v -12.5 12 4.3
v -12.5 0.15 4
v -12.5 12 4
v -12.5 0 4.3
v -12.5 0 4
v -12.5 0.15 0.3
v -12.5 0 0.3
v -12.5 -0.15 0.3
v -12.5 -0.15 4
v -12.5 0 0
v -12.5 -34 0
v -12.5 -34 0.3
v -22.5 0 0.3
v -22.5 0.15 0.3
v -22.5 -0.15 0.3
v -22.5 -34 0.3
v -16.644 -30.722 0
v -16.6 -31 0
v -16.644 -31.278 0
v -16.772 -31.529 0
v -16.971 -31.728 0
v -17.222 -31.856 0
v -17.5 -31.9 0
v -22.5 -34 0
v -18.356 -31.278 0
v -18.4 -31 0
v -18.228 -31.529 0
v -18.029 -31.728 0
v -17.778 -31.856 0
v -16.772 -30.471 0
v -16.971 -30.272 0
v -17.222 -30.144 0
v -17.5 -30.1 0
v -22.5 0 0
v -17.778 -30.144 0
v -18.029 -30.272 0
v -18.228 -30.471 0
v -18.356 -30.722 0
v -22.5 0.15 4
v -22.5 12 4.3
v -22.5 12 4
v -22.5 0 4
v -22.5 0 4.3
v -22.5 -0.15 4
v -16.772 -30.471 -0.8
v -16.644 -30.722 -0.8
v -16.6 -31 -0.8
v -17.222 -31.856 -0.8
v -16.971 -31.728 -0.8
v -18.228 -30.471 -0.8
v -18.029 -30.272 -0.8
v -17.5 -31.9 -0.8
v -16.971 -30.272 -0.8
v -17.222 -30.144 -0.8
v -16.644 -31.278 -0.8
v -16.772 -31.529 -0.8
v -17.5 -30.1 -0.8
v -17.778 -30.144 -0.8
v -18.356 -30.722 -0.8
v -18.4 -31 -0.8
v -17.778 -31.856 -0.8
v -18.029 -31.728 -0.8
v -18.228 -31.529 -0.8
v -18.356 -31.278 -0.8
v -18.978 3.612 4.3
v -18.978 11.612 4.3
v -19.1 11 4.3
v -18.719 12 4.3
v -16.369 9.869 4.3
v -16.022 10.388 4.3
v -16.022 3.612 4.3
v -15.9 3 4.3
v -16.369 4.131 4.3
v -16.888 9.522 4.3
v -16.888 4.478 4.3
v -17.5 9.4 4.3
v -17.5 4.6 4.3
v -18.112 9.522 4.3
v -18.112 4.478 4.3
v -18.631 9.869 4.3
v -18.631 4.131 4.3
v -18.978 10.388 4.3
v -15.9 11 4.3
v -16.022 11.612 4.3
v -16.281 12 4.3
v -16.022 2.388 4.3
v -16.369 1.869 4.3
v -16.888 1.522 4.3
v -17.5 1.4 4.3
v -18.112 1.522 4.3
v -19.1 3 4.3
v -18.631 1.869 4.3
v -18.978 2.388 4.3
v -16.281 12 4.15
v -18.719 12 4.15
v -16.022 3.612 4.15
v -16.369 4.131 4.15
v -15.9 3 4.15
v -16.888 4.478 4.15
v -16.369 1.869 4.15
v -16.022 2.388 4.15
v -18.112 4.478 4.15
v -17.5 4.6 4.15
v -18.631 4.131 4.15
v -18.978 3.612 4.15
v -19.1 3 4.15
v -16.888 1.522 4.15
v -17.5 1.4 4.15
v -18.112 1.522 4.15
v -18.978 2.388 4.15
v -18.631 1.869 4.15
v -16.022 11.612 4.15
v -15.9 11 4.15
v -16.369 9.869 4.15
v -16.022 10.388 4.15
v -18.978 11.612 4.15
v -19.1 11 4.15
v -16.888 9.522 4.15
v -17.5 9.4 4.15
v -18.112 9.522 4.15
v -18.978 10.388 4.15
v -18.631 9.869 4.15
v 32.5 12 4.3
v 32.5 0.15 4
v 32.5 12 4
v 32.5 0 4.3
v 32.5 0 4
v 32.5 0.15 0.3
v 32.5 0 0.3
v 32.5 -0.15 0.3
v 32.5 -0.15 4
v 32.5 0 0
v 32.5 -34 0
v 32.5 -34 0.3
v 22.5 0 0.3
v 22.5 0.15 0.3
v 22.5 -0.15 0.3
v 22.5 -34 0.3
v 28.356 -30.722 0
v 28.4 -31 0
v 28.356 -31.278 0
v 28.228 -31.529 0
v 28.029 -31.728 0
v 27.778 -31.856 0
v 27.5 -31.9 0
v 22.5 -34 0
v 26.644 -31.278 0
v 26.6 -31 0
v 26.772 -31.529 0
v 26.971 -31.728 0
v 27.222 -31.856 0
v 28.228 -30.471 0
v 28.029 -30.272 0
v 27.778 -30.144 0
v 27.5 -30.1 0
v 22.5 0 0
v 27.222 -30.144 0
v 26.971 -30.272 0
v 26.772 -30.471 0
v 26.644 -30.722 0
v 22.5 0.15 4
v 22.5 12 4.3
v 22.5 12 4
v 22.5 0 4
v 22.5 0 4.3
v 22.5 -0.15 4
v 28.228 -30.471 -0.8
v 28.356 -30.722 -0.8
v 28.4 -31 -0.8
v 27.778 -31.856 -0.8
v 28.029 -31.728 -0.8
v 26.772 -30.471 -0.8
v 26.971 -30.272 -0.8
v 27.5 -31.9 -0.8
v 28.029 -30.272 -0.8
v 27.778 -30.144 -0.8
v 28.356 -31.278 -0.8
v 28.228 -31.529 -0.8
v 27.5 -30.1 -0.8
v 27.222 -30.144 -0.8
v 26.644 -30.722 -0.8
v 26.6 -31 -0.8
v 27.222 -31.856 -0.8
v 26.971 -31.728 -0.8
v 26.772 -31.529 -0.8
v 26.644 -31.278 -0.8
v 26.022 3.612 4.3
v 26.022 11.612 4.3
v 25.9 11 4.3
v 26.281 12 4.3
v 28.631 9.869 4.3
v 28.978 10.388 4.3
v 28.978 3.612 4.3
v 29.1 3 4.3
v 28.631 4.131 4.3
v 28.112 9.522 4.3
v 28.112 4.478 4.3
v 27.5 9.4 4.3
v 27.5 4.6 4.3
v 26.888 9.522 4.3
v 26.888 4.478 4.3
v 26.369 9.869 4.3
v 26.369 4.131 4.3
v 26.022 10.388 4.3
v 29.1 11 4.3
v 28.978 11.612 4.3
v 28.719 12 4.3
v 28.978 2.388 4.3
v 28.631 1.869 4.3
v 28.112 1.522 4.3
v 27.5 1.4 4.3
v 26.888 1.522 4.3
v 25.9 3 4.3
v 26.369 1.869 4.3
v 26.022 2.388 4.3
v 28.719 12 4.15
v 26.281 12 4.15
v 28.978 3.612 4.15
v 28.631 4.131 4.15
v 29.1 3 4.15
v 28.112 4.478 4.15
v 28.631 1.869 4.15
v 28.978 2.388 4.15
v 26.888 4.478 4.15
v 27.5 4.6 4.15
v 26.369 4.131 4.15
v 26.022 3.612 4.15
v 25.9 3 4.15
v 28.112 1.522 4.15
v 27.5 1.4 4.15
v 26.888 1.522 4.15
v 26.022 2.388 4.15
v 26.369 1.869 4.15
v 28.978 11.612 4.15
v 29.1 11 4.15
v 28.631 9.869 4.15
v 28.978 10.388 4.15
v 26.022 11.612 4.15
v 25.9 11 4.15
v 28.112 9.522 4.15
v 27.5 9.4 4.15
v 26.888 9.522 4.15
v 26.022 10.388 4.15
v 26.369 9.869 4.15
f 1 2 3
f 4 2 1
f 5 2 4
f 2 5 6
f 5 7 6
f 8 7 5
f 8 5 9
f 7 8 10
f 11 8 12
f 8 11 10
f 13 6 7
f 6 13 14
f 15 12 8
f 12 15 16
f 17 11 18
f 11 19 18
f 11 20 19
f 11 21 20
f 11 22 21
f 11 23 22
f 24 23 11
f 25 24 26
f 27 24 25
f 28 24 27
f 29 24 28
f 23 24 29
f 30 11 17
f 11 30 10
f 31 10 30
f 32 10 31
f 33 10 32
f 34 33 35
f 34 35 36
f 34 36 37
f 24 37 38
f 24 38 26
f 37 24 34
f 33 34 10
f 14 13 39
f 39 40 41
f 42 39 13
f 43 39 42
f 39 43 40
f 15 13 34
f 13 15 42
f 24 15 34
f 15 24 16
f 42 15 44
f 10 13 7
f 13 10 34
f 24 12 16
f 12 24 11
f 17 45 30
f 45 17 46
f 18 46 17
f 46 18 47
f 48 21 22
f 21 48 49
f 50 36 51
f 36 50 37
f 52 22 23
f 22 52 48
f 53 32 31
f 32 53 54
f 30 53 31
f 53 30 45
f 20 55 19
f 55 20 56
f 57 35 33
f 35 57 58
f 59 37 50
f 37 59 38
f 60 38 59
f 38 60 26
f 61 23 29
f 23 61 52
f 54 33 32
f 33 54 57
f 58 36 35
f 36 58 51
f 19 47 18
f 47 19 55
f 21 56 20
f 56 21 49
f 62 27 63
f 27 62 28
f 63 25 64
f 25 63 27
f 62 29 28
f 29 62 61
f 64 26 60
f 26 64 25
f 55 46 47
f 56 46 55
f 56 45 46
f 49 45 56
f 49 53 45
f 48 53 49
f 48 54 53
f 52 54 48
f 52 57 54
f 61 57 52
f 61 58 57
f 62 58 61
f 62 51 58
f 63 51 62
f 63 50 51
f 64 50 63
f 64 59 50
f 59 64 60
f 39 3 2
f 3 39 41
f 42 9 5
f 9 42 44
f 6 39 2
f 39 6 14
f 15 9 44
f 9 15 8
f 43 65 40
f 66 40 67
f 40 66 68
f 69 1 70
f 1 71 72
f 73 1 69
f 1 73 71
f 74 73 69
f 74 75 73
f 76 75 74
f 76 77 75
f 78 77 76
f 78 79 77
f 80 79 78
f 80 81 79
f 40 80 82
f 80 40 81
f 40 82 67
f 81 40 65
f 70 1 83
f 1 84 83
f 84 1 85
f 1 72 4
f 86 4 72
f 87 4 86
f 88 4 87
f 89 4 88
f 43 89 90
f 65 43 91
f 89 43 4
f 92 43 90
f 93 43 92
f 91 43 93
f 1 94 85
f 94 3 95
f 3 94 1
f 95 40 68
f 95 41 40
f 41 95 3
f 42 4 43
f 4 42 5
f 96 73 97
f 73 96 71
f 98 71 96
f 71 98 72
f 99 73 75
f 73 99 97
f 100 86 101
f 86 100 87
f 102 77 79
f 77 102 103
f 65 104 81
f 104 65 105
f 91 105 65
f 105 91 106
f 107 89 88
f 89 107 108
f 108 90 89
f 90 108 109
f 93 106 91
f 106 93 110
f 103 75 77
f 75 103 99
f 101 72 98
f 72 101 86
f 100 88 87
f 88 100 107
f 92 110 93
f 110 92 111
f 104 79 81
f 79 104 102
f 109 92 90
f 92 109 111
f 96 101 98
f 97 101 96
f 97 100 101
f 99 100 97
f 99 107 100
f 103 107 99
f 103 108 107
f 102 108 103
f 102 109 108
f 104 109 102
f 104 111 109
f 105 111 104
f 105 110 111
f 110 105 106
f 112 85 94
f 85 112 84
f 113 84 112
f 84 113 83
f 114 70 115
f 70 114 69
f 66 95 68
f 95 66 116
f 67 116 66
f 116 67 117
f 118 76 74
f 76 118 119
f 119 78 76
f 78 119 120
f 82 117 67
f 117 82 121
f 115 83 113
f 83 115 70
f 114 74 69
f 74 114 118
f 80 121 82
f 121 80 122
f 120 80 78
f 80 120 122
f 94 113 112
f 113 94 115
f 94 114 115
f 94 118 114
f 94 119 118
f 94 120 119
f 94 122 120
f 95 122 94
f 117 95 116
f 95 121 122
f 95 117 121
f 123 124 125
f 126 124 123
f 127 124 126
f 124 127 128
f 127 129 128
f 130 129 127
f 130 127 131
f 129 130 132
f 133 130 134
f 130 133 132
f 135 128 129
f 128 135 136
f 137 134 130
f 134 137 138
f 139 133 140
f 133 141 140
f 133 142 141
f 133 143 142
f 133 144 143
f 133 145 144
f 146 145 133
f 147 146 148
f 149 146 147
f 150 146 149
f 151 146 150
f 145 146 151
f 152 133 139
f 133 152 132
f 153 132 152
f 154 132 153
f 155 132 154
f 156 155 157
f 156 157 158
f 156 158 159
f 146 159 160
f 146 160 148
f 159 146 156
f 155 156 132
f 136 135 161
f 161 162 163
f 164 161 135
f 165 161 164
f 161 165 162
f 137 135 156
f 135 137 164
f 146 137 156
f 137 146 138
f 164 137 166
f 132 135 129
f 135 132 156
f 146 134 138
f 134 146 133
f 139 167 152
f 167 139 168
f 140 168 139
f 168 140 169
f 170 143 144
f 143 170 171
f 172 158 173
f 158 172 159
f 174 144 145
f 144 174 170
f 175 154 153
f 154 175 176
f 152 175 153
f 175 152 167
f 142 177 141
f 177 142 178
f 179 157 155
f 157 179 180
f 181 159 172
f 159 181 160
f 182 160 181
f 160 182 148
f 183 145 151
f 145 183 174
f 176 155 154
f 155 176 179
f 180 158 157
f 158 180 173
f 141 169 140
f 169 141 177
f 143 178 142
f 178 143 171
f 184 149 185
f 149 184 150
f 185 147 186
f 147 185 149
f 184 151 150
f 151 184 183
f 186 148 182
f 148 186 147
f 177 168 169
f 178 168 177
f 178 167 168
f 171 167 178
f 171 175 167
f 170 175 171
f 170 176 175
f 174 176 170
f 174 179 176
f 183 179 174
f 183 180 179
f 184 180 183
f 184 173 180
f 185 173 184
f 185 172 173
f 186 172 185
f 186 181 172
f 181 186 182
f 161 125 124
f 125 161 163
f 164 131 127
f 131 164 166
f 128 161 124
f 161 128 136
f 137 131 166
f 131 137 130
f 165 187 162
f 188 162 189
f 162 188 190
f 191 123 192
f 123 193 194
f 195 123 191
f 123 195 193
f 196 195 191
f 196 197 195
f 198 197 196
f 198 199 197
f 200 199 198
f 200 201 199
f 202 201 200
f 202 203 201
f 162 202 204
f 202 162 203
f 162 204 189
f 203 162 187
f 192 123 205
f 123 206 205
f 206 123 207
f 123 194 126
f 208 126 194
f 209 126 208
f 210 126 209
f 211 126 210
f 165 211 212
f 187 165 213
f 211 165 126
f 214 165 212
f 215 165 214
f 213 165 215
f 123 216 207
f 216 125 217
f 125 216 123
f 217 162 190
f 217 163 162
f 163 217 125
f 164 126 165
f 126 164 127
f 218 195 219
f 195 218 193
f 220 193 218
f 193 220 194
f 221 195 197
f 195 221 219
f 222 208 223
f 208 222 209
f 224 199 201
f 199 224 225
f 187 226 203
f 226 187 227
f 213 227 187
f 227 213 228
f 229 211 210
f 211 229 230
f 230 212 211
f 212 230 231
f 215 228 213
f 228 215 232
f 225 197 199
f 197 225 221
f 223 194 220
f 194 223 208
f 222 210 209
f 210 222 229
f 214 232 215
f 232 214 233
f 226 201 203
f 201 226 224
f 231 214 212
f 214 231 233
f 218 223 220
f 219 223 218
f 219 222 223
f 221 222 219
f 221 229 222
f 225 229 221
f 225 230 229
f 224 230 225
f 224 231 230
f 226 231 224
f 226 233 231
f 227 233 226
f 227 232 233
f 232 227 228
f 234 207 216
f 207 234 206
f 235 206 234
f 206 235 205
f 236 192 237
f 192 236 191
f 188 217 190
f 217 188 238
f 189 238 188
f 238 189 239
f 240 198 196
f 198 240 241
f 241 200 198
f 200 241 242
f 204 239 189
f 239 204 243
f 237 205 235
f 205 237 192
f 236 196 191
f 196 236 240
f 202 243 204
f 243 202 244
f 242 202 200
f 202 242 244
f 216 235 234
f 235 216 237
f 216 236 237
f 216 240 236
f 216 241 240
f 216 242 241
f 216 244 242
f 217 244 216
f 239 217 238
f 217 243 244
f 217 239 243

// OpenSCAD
// Charging Contacts — robot-side nickel-plated steel strip + dock-side pogo pin
// BOM: "Charging contacts | 1 pair | $3-5 | Nickel-plated steel strip | ≥10mm
//      wide, ≥0.1mm thick, ~5cm long" (robot), and "Charging contacts | 2-4 |
//      2-6? | Gold-plated pogo pins ≥4A; rear-vertical, above water line" (dock).
//
// Provenance:
//   - Robot strip envelope (width "≥10mm", length "~5cm", thickness "≥0.1mm")
//     is BOM-confirmed (BOM.md line 59, upstream/main fetched 2026-08-13).
//   - Dock pogo (≥4A, gold-plated, rear-vertical) is BOM-confirmed (BOM.md
//     line 93). Pogo BARREL geometry is (estimate) — BOM gives no dimensions.
//   - WARNING: the in-tree part-specs doc
//     part-specs/OsakaTX/side-brush-charging-contacts-specs.md (compiled
//     2026-07-16) says the robot strip is "~1mm wide" — this CONFLICTS with the
//     current BOM "≥10mm wide". The model follows the CURRENT BOM (primary);
//     the part-specs figure appears stale. Do not inherit the 1mm figure.
//   - Everything not marked (BOM:) is (estimate) and waits for the maintainer's
//     calipers (see MEASURE-ME.md §17) before the mount/housing uses it.
//
// Coordinate convention: the robot chassis floor (the plane the strip blade
// lies on) is z = 0, blade top face at z = strip_t. The dock-facing contact
// face is the blade's UNDERSIDE (negative z). The bend/tab rise into +z
// (robot interior).
//
// Licensed CC0 — use freely.

// ===== PARAMETERS =====

// ---- Shared interface (robot AND dock MUST agree) ----
contact_pitch = 45.0; // mm (estimate) center-to-center between the two charging
                      //   contact pairs. THE critical mated dimension: the dock
                      //   pogo pins and the robot strips must share it, and it
                      //   must match any consumer-dock chassis you reuse.
                      //   Verify against the dock geometry FIRST (MEASURE-ME §17
                      //   rows 9 & 16); everything downstream hangs off it.

// ---- Robot-side nickel-plated steel strip (×2) ----
//      BOM: "≥10mm wide, ≥0.1mm thick, ~5cm long"
strip_w  = 10.0;  // mm (BOM: "≥10mm wide" — modeled at the stated lower bound)
strip_l  = 50.0;  // mm (BOM: "~5cm long") — TOTAL strip material length;
                  //   unfolded sheet ≈ blade_l + tab_l + bend_h ≈ 50
strip_t  =  0.3;  // mm (estimate) BOM floor is "≥0.1mm" but 0.1mm spring-steel
                  //   foil would be too flimsy to hold spring force against dock
                  //   pogo pins; 0.2-0.5mm strip stock is typical for spring-
                  //   contacts. VERIFY the actual stock you buy (MEASURE-ME §17
                  //   row 2) and set this to the measured thickness.
blade_l  = 34.0;  // mm (estimate) blade length bend→tip: set so
                  //   blade_l + tab_l + bend_h ≈ strip_l (34+12+4 = 50 = BOM
                  //   "~5cm"). of which only the tip region is dock-facing
bend_h   =  4.0;  // mm (estimate) height of the 90° bend leg above the chassis
                  //   floor (blade top at z=strip_t → bend top at z=bend_h)
tab_l    = 12.0;  // mm (estimate) internal mounting tab length behind the bend
                  //   (solder pad or screw plate)
screw_dia   = 3.2; // mm (estimate) M3 screw clearance for the tab mount;
                   //   0 disables the (optional) screw holes
screw_pitch =  8.0; // mm (estimate) tab screw-hole spacing ALONG the tab length
screw_inset =  3.0; // mm (estimate) first hole center from the bend leg
lip_dia     =  1.8; // mm (estimate) raised contact bump Ø on the blade underside
lip_raise   =  0.8; // mm (estimate) contact bump protrusion below the chassis
                    //   floor plane, toward the dock pogo plunger

// ---- Dock-side gold-plated pogo pin (×2-4) ----
//      BOM: "Gold-plated pogo pins ≥4A; rear-vertical, above water line"
pogo_barrel_d  =  3.0;  // mm (estimate) common 4A+ charging pogo barrel Ø
pogo_barrel_l  = 12.0;  // mm (estimate) barrel length
pogo_plunger_d =  1.5;  // mm (estimate) plunger (tip) Ø
pogo_stroke    =  2.0;  // mm (estimate) free plunger working stroke; per
                        //   part-specs doc (secondary, vendor guides) 1.5-3mm is
                        //   typical for robot vacuum charging — VERIFY
pogo_shoulder_d=  4.0;  // mm (estimate) press-fit shoulder Ø at the barrel rear
pogo_shoulder_l=  1.0;  // mm (estimate)
pogo_head_d    =  4.5;  // mm (estimate) crimped head Ø at the plunger end

$fn = 32;

// ===== MODULES =====

module strip_solid() {
    // Blade (dock-facing contact area), from the bend line (y=0) back to the
    // free tip at y = -blade_l, flat on the chassis floor z∈[0, strip_t].
    color("SteelBlue", 0.9) {
        translate([0, -blade_l, 0])
            cube([strip_w, blade_l, strip_t]);
        // Raised contact bump on the blade UNDERSIDE (the high spot the dock
        // pogo plunger presses on), near the free tip, protruding below the
        // floor plane. (Position 3mm inboard of the tip = estimate.)
        translate([strip_w/2, -(blade_l - 3), -lip_raise])
            cylinder(d = lip_dia, h = lip_raise, $fn = 20);
    }
    // Bend leg (vertical 90°), z from strip_t up to bend_h.
    color("SteelBlue", 0.95) {
        translate([0, -strip_t/2, strip_t])
            cube([strip_w, strip_t, bend_h - strip_t]);
    }
    // Internal mounting tab (horizontal, raised to z = bend_h..bend_h+strip_t).
    color("Silver", 0.9) {
        translate([0, 0, bend_h])
            cube([strip_w, tab_l, strip_t]);
    }
}

module robot_strip_single() {
    if (screw_dia > 0) {
        difference() {
            strip_solid();
            // Vertical (Z-axis) through-holes in the raised tab — real voids.
            for (i = [0 : 1]) {
                translate([strip_w/2, screw_inset + i * screw_pitch, bend_h + strip_t/2])
                    cylinder(d = screw_dia, h = strip_t + 0.1, $fn = 16);
            }
        }
    } else {
        strip_solid();
    }
}

module robot_strip_pair() {
    for (x = [-contact_pitch/2, contact_pitch/2])
        translate([x, 0, 0]) robot_strip_single();
}

module dock_pogo_single() {
    // Vertical pin, rear (shoulder) at z=0, plunger pointing +Z (toward robot).
    color("Goldenrod", 0.95) {
        // Press-fit shoulder
        cylinder(d = pogo_shoulder_d, h = pogo_shoulder_l);
        // Barrel body
        translate([0, 0, pogo_shoulder_l])
            cylinder(d = pogo_barrel_d, h = pogo_barrel_l);
        // Crimped head
        translate([0, 0, pogo_shoulder_l + pogo_barrel_l])
            cylinder(d = pogo_head_d, h = 1.0);
        // Free plunger (shown at mid-stroke, extended pogo_stroke/2)
        translate([0, 0, pogo_shoulder_l + pogo_barrel_l + 1.0])
            cylinder(d = pogo_plunger_d, h = pogo_stroke/2);
        // Tip dome
        translate([0, 0, pogo_shoulder_l + pogo_barrel_l + 1.0 + pogo_stroke/2])
            sphere(d = pogo_plunger_d + 0.4);
    }
}

module dock_pogo_pair() {
    for (x = [-contact_pitch/2, contact_pitch/2])
        translate([x, 0, 0]) dock_pogo_single();
}

// ===== RENDER =====
// Default shows the robot strip pair — the purchased BOM item the mount is
// built around. Set render_part = "pogo" to inspect the dock side.
render_part = "strip"; // "strip" | "pogo" | "both"

if (render_part == "strip")  robot_strip_pair();
if (render_part == "pogo")   dock_pogo_pair();
if (render_part == "both") {
    robot_strip_pair();
    translate([0, 0, -6]) dock_pogo_pair();
}
